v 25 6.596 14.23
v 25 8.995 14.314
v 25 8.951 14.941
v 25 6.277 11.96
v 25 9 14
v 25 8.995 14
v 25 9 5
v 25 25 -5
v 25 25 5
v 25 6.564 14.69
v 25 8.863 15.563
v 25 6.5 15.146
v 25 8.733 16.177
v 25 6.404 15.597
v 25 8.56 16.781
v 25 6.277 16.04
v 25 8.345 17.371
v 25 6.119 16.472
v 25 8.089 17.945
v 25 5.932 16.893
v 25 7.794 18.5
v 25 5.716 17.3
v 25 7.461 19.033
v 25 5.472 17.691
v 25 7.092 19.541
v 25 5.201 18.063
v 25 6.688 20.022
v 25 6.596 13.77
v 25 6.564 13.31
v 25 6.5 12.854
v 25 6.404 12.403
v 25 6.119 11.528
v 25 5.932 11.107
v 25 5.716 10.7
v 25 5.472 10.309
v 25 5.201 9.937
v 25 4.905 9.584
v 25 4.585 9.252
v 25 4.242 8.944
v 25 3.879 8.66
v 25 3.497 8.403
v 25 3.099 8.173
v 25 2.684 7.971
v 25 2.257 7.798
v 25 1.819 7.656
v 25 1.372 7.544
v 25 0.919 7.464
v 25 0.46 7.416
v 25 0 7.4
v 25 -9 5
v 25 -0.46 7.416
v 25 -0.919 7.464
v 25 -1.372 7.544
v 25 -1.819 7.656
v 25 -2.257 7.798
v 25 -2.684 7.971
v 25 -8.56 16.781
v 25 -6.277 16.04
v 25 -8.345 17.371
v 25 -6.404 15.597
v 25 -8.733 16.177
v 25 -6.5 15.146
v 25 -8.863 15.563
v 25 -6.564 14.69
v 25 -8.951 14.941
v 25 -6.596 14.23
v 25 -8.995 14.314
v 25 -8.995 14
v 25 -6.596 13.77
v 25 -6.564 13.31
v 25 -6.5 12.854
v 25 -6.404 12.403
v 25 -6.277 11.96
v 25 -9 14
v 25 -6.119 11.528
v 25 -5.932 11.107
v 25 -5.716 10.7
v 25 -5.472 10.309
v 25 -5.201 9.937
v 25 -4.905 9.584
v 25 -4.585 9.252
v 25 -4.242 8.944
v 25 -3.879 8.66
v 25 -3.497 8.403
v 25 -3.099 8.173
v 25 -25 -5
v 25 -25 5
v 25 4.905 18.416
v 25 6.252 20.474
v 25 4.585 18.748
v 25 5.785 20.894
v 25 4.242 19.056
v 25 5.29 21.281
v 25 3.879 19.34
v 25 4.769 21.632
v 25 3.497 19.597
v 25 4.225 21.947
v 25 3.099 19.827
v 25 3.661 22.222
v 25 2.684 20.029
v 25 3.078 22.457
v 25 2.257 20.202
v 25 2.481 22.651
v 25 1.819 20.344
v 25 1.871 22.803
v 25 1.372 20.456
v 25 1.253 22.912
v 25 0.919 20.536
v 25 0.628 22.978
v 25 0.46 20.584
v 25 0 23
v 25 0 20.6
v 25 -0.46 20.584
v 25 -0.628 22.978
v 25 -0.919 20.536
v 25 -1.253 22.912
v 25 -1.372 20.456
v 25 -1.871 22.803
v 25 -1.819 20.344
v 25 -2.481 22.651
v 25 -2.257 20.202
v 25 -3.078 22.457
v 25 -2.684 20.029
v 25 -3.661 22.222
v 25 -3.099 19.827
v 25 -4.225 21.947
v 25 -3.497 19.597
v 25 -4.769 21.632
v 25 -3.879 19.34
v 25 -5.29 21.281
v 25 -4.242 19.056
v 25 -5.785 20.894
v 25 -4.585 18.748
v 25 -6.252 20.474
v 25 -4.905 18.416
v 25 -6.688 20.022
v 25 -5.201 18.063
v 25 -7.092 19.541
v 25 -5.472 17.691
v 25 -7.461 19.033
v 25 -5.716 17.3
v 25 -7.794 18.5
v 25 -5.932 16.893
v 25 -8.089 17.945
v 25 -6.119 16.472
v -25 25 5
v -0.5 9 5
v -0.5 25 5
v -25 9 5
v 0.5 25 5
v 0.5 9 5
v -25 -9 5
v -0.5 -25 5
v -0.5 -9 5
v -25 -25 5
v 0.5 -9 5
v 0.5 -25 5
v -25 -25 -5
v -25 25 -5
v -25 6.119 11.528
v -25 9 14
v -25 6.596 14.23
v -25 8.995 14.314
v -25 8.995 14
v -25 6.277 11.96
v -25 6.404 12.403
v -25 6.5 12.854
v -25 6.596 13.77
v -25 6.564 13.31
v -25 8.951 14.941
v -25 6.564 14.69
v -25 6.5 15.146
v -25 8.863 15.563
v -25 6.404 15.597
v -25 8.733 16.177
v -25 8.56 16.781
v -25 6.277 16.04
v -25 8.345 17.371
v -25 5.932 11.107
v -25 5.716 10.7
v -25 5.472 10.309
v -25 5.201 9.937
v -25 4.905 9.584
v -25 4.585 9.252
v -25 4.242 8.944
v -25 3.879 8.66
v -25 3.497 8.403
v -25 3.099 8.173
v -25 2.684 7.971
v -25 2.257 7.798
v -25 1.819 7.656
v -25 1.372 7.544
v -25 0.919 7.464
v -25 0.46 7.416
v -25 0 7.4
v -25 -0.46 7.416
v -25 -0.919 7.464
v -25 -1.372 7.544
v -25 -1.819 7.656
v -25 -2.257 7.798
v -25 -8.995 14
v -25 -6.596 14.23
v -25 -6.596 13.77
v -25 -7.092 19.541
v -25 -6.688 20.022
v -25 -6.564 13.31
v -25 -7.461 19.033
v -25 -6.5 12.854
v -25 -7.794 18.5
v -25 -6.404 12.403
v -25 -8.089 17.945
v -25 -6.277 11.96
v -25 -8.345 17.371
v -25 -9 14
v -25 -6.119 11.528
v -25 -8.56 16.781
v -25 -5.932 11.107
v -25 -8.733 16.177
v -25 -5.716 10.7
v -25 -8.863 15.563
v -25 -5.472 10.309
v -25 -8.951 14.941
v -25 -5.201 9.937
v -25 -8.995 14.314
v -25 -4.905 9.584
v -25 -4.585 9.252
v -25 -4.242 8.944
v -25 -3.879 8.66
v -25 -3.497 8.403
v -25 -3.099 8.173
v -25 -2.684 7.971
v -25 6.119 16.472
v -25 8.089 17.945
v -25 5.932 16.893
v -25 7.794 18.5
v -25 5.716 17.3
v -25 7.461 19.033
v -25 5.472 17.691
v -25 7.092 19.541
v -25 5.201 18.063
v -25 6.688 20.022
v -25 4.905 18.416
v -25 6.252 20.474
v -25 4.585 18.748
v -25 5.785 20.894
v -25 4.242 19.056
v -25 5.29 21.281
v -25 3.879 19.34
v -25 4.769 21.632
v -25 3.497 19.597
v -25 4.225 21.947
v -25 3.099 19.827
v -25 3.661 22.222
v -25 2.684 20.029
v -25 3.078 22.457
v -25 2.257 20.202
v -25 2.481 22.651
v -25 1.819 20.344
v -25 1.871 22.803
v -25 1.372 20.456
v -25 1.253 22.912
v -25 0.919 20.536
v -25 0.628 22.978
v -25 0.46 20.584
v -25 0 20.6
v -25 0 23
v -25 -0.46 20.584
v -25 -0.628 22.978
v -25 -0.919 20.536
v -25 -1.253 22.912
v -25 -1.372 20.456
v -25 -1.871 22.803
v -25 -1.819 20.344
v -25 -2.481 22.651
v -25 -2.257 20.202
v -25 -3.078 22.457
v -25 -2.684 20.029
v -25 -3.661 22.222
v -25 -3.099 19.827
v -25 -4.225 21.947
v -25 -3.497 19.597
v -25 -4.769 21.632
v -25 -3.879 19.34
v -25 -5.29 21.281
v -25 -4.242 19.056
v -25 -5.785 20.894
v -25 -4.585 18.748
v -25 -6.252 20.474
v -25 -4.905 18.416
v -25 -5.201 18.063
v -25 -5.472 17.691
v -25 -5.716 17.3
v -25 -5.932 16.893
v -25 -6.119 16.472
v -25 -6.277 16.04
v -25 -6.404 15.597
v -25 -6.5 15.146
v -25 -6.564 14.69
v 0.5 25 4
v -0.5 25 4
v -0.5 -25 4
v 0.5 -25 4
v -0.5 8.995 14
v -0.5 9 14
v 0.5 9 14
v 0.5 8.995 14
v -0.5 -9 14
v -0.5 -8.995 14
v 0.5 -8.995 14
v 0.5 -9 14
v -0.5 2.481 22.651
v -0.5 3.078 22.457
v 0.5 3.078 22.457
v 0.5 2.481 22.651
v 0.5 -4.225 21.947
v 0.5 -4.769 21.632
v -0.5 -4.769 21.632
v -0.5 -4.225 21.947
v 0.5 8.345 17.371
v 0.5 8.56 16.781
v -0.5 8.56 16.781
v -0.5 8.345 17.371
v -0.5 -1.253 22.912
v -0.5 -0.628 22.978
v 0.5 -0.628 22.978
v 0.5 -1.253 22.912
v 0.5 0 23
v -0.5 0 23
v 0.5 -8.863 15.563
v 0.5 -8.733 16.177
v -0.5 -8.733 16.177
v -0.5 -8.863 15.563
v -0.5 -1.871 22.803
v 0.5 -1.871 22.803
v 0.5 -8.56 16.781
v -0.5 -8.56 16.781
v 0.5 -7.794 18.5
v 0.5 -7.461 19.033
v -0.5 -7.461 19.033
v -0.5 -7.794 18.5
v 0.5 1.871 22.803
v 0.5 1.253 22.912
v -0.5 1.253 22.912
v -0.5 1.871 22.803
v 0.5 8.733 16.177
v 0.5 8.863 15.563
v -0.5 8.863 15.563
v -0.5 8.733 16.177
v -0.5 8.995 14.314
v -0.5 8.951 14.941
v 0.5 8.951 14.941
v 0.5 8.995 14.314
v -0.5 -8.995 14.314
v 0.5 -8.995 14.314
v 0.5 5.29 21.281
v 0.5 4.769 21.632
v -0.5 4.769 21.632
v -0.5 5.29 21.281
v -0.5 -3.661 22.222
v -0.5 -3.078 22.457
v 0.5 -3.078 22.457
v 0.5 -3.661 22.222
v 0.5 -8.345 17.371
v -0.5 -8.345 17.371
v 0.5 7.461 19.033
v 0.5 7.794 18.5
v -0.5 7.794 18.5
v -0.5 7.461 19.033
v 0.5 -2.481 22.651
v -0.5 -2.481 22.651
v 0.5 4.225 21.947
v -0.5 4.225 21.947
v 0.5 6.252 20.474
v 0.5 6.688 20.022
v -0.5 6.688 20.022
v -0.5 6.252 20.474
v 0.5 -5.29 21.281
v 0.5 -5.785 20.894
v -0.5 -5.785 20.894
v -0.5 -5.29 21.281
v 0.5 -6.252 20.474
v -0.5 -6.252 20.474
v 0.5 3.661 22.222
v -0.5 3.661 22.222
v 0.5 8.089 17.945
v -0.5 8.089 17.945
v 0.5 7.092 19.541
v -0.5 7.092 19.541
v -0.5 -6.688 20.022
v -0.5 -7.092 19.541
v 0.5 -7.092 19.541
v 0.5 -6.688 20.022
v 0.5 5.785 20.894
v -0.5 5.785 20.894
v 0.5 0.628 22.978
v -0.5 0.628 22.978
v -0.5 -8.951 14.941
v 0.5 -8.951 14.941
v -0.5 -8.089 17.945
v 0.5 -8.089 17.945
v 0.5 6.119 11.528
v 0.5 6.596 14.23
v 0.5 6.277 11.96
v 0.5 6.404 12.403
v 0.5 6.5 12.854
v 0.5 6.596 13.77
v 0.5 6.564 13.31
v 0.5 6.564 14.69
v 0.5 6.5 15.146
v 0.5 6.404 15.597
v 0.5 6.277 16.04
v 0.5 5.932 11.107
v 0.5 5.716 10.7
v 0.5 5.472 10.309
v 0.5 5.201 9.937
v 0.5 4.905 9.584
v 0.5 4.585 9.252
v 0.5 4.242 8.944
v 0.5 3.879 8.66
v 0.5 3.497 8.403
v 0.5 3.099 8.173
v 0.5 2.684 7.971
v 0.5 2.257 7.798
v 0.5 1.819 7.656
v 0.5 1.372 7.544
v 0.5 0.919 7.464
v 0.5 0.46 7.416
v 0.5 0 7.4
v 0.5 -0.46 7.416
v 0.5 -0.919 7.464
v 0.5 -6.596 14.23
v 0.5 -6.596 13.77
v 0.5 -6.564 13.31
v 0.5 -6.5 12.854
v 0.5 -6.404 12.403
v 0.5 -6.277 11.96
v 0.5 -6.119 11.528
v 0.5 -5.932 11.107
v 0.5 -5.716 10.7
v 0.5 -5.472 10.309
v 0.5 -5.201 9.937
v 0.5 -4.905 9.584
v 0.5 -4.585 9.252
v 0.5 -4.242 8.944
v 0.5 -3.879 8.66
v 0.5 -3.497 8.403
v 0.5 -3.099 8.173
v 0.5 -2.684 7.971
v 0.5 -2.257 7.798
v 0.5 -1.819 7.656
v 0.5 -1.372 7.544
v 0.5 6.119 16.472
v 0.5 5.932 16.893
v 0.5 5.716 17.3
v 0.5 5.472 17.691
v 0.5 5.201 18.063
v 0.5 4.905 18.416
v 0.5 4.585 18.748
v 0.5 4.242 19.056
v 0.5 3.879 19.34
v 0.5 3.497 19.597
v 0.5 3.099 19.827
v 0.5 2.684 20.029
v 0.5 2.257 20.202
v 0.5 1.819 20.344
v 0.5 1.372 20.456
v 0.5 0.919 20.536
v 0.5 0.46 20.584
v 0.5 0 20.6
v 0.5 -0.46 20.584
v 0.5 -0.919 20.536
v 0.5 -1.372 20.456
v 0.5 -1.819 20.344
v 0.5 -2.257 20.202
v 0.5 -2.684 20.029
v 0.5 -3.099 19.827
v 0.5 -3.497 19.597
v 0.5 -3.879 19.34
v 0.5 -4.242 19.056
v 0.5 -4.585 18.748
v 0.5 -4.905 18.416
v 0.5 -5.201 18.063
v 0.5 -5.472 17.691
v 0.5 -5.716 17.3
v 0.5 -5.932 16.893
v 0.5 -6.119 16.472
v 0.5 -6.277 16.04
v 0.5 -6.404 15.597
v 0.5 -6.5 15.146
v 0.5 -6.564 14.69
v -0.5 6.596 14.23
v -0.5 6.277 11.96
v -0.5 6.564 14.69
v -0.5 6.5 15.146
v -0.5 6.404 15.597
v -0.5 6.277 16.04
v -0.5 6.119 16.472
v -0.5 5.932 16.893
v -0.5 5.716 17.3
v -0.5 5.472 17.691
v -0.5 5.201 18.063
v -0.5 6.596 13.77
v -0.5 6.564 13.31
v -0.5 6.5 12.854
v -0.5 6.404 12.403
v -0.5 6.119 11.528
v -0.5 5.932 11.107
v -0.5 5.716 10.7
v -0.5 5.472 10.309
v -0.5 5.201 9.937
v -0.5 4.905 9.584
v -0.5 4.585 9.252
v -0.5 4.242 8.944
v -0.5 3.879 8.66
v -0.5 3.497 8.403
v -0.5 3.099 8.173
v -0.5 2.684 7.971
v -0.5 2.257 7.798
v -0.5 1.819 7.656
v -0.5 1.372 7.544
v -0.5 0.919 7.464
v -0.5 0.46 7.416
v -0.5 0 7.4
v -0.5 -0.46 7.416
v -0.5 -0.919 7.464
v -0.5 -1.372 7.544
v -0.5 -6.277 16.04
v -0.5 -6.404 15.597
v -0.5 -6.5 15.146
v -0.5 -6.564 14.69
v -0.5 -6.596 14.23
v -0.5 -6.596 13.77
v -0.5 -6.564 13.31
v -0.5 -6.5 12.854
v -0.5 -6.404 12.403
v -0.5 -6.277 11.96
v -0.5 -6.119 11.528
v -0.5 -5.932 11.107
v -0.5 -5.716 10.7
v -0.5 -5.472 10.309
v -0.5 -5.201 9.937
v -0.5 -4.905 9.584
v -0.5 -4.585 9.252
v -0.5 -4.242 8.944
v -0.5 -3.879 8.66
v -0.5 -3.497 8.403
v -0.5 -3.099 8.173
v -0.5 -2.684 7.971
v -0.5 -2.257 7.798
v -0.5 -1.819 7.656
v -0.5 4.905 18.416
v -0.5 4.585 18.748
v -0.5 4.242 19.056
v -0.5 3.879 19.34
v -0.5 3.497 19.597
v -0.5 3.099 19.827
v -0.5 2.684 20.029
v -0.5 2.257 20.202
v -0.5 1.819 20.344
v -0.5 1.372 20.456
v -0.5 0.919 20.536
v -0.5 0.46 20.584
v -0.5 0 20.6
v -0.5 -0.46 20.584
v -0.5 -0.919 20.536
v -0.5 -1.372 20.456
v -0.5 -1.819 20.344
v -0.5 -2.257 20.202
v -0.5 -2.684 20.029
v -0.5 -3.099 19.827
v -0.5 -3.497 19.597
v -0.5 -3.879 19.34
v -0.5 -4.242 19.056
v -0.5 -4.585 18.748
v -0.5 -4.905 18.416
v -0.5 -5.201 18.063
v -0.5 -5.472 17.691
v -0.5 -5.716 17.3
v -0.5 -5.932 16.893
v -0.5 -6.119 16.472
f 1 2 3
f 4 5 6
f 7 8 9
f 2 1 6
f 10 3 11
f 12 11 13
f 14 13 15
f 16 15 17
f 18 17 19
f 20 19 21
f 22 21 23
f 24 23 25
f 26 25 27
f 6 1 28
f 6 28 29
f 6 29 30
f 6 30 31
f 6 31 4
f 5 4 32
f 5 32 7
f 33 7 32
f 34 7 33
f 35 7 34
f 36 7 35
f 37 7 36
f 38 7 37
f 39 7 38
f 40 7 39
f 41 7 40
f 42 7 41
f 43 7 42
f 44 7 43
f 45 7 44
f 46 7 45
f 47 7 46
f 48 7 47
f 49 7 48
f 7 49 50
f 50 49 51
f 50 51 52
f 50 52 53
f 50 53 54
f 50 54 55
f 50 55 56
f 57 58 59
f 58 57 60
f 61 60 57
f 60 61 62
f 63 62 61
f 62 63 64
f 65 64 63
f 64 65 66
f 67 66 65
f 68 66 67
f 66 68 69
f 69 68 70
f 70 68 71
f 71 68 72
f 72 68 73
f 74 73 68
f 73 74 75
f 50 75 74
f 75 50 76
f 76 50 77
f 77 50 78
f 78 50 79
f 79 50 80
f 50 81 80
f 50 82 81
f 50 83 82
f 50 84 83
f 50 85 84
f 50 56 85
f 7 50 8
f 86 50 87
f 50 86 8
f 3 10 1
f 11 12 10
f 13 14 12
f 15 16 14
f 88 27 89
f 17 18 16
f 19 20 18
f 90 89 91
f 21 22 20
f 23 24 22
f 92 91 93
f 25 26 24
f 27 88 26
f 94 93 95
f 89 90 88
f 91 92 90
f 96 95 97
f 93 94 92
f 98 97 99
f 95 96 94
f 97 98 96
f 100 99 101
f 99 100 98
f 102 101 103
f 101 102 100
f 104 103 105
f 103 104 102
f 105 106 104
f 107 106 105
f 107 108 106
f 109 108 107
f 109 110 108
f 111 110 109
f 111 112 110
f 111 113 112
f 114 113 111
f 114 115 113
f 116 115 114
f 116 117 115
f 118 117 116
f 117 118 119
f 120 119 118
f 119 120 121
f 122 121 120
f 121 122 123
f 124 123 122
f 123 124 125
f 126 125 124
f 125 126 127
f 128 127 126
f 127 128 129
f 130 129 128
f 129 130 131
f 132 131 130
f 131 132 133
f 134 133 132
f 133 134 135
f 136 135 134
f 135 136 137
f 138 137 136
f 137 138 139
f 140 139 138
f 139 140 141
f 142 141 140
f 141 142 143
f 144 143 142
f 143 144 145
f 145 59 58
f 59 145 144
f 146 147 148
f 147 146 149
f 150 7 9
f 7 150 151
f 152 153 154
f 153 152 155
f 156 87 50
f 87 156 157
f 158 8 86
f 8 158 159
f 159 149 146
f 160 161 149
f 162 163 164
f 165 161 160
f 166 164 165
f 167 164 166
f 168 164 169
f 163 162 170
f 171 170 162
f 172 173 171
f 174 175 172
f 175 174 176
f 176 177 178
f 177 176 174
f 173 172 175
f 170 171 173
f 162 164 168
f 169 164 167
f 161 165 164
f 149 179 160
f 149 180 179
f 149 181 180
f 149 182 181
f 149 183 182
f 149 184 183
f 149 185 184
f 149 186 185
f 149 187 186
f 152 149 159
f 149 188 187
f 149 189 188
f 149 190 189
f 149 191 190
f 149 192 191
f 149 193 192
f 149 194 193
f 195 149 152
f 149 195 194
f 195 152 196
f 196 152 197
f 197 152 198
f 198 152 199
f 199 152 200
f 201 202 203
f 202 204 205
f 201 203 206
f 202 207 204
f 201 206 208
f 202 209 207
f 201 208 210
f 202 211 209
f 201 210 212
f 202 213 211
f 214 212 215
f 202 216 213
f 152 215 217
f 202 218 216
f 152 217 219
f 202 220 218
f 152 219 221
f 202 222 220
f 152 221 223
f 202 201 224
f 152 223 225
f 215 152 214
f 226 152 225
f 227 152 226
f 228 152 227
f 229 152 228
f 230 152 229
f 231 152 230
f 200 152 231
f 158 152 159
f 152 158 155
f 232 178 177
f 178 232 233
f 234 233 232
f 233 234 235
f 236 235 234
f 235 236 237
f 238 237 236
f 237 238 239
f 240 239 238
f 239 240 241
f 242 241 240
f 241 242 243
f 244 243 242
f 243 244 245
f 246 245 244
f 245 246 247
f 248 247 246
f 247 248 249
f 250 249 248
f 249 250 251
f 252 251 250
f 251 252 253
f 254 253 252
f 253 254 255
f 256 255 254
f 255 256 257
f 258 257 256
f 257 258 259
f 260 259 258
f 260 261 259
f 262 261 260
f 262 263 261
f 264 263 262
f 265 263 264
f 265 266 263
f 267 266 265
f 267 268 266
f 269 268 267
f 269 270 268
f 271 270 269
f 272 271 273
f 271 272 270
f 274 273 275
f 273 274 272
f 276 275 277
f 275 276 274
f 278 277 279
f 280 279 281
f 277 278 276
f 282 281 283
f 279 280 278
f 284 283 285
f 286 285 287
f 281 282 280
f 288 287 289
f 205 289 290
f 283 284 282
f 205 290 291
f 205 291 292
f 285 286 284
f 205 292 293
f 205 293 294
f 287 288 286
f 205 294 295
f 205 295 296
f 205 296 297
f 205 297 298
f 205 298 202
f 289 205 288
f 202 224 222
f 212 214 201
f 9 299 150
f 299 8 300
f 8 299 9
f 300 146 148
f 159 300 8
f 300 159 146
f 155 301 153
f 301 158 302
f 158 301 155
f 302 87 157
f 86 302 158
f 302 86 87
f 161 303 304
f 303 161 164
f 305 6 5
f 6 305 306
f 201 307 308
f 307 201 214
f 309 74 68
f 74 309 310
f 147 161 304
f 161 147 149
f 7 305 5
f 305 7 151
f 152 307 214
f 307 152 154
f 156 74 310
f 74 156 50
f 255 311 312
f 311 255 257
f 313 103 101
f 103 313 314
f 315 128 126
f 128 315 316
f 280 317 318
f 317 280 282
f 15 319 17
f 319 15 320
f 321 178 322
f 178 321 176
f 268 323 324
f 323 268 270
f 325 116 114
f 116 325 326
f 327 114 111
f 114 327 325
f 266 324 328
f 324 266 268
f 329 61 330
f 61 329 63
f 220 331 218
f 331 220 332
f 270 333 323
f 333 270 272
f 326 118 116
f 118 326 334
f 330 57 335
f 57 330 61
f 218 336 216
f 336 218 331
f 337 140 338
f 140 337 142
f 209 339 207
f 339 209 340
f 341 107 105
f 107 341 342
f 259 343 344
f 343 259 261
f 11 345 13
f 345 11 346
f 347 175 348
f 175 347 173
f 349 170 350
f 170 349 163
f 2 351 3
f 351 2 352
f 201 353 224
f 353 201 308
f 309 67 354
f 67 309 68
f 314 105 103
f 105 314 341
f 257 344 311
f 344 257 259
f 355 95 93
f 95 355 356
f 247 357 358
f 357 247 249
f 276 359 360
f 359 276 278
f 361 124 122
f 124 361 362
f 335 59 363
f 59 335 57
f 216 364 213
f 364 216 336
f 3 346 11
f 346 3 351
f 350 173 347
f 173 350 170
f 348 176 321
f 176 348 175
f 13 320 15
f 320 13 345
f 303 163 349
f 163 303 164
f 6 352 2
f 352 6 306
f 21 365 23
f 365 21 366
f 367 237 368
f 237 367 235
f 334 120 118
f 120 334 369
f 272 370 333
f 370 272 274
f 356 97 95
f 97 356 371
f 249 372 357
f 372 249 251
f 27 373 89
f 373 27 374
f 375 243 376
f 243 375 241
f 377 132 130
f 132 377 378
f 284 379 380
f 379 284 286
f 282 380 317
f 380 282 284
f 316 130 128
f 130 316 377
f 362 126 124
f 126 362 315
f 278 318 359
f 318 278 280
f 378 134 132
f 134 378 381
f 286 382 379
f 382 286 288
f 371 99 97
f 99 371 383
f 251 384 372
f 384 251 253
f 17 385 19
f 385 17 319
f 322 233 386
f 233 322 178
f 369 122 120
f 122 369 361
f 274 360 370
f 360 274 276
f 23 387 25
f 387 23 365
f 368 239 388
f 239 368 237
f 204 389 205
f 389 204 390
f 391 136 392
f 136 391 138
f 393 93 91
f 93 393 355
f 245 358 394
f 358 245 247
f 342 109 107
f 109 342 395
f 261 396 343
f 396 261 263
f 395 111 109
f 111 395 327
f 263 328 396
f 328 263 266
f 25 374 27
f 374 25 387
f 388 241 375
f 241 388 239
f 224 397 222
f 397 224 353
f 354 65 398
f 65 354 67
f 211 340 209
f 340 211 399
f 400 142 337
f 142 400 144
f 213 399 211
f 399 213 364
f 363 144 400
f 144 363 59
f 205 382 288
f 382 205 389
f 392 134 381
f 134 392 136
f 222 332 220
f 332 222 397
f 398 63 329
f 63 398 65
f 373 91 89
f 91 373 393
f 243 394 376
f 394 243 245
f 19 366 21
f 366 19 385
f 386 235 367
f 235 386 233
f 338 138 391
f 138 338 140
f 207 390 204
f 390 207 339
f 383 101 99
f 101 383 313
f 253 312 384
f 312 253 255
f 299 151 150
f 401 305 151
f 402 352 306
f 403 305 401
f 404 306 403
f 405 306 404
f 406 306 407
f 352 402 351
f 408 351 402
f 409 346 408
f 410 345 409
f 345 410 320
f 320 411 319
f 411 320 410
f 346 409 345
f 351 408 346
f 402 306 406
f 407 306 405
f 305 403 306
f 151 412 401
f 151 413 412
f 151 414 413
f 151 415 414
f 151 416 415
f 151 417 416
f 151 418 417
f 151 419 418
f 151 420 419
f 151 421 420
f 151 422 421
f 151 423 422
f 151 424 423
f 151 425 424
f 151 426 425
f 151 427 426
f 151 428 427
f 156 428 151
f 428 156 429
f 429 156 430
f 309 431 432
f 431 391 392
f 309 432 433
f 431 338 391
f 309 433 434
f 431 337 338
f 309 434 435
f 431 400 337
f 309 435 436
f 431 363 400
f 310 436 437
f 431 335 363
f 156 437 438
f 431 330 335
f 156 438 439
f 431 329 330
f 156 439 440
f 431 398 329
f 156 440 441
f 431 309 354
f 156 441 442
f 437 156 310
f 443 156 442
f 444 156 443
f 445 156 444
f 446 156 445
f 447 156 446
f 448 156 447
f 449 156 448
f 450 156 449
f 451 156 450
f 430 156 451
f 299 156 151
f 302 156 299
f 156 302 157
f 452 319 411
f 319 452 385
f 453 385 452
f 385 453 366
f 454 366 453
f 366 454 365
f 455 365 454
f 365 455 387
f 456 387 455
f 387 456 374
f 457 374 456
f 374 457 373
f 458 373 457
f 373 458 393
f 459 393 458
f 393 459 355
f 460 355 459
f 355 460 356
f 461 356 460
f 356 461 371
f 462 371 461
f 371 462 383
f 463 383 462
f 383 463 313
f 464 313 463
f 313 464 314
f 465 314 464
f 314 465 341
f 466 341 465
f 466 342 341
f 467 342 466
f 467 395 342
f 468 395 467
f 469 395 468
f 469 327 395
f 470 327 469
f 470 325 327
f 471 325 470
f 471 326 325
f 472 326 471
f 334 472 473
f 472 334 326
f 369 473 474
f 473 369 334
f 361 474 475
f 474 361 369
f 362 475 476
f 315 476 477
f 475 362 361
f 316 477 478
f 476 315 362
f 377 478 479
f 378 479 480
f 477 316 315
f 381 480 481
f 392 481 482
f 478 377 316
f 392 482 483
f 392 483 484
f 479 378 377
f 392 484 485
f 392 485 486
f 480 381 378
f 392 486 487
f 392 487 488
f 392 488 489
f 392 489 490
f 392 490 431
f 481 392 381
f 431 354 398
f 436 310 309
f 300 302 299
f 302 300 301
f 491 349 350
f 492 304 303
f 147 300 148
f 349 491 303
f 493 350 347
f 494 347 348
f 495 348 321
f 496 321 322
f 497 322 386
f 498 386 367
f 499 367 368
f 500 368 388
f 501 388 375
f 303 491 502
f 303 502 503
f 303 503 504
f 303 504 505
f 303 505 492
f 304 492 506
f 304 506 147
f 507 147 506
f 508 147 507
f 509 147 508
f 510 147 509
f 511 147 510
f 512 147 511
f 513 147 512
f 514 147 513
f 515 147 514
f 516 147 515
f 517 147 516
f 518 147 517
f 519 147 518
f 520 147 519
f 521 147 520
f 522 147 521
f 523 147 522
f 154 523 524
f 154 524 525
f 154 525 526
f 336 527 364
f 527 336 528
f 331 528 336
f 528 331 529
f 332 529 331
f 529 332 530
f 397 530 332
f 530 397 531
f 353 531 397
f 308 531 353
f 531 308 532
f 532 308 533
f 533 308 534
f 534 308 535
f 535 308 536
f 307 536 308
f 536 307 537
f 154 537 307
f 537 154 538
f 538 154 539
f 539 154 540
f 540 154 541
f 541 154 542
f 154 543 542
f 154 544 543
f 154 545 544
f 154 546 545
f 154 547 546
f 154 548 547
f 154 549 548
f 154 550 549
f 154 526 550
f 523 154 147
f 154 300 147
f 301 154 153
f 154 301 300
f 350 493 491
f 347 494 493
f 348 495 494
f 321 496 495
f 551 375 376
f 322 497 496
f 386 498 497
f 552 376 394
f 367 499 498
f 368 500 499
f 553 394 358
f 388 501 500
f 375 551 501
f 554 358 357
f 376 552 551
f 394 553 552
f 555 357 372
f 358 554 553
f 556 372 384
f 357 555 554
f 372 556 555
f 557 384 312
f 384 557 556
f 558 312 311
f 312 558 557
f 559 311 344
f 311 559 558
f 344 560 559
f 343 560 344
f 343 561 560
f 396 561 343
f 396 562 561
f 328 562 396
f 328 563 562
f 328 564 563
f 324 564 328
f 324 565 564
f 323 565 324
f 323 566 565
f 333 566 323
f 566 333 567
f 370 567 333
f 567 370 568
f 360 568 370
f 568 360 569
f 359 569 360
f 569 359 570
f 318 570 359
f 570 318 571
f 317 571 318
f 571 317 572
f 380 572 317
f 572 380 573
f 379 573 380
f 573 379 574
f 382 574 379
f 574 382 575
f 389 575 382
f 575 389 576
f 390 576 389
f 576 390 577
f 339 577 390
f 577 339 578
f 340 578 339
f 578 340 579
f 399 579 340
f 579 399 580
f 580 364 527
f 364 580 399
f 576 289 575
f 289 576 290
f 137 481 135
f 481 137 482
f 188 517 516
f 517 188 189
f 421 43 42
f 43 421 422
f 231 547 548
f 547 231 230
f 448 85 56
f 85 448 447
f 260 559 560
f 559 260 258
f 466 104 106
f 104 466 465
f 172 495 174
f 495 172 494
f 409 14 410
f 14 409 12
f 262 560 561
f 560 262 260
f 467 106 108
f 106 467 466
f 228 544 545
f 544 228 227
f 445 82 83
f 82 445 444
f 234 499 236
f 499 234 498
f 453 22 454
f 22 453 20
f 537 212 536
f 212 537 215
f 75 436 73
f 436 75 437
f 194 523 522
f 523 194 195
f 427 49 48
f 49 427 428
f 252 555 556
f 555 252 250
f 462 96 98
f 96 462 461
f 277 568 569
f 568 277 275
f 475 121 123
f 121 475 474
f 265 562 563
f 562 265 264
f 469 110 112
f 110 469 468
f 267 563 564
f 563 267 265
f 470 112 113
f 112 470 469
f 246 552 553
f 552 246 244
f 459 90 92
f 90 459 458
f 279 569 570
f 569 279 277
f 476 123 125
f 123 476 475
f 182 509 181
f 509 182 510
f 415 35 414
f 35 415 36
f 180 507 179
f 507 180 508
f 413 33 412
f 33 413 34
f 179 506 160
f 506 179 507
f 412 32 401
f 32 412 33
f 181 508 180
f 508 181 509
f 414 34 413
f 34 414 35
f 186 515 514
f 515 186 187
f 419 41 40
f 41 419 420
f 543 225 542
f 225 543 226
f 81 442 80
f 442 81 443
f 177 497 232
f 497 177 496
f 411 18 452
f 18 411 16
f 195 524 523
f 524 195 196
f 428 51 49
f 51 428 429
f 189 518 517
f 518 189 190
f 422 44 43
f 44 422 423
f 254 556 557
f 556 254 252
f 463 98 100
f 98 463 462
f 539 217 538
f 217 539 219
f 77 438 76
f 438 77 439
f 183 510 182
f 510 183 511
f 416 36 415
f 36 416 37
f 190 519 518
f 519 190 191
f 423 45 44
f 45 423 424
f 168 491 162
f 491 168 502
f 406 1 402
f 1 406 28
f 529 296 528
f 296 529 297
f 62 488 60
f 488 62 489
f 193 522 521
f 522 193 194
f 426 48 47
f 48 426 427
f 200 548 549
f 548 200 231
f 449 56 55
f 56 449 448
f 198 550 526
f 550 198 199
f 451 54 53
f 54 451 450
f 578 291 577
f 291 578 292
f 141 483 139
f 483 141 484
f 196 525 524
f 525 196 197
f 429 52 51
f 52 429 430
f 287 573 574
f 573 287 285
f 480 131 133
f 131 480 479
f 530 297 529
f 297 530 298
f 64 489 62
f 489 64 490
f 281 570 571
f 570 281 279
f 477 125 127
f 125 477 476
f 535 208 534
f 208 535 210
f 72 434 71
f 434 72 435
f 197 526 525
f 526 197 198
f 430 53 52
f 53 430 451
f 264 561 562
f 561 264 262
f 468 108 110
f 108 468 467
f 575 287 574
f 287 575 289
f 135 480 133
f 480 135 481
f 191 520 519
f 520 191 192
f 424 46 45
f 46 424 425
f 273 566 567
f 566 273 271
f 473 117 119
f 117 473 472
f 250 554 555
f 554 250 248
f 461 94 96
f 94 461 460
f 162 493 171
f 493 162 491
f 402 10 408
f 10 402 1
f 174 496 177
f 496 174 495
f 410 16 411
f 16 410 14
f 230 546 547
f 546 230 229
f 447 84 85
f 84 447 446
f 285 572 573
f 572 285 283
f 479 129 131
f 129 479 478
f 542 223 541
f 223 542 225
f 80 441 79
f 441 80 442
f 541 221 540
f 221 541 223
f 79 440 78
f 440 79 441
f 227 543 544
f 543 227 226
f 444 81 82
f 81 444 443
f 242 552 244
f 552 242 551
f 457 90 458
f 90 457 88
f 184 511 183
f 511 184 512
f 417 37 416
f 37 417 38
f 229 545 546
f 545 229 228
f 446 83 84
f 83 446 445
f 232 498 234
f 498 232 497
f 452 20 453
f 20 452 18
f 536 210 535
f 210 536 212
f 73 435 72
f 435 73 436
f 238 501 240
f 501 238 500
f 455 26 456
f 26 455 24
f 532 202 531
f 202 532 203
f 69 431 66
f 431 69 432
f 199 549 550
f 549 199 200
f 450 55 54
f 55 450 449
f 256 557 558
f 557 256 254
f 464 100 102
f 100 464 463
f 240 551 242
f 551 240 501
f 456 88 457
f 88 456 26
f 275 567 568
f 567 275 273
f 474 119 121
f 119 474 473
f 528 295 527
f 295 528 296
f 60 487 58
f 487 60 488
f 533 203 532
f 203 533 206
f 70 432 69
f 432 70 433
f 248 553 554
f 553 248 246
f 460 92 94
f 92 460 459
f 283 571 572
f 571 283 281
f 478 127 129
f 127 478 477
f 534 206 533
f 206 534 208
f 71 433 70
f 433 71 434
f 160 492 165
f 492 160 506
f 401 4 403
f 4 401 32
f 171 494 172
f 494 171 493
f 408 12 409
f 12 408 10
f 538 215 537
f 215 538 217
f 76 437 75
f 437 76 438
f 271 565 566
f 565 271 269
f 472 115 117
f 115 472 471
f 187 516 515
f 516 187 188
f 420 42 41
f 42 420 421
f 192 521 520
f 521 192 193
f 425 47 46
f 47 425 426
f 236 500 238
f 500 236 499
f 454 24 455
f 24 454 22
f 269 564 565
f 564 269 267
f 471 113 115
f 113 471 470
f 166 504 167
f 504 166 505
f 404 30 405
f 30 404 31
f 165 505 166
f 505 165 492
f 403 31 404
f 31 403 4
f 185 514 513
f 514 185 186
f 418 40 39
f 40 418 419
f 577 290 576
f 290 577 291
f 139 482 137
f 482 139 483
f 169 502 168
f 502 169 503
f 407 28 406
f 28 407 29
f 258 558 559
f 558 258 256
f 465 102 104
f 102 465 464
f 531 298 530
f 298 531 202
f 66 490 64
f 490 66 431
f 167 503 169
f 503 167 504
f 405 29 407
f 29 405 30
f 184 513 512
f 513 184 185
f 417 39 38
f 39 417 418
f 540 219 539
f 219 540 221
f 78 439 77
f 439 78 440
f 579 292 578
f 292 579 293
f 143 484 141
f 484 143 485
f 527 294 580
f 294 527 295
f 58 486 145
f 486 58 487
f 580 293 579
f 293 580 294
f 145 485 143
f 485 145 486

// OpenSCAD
// file: _common.scad
$fa=4; // default minimum facet angle is now 0.5
$fs=0.05; // default minimum facet size is now 0.05 mm

holeRad = 6.4;
wallThickness = 2.4;
insertDepth = 20;
offsetDepth = 7;
screwHoleDiam = 4.75;
countersinkDiam = 9;
footHeight = 10;
distanceFromWall = 38 - holeRad;


module chamferedScrewHole(rh, rs, d, ds, t = .1) {
  translate([0, 0, -t]) cylinder(r=rs, h=d + t);
  translate([0, 0, d - ds + t]) cylinder(r1=rs, r2=rh, h=ds + t);
  translate([0, 0, d - ds + 2*t + ds - .01]) cylinder(r=rh, h=ds + t + 5);
}
// main file
$fa=4; // default minimum facet angle is now 0.5
$fs=0.05; // default minimum facet size is now 0.05 mm
include <_common.scad>

holeRadPlus = holeRad + .2;

difference() {
  union() {
    cube([50, 50, 10], center=true);
    translate([0, 0, (holeRadPlus + wallThickness) / 2]) cube([50, (holeRadPlus + wallThickness) * 2, 10 + (holeRadPlus + wallThickness)], center=true);
    translate([0, 0, holeRadPlus + wallThickness + 5]) rotate([0, 90, 0]) cylinder(h = 50, r = (holeRadPlus + wallThickness), center=true);
  }

  translate([0, 0, 29]) cube([1, 51, 50], center=true);
  translate([0, 0, holeRadPlus + wallThickness + 5]) rotate([0, 90, 0]) cylinder(h = 50.2, r = holeRadPlus, center=true);
}
